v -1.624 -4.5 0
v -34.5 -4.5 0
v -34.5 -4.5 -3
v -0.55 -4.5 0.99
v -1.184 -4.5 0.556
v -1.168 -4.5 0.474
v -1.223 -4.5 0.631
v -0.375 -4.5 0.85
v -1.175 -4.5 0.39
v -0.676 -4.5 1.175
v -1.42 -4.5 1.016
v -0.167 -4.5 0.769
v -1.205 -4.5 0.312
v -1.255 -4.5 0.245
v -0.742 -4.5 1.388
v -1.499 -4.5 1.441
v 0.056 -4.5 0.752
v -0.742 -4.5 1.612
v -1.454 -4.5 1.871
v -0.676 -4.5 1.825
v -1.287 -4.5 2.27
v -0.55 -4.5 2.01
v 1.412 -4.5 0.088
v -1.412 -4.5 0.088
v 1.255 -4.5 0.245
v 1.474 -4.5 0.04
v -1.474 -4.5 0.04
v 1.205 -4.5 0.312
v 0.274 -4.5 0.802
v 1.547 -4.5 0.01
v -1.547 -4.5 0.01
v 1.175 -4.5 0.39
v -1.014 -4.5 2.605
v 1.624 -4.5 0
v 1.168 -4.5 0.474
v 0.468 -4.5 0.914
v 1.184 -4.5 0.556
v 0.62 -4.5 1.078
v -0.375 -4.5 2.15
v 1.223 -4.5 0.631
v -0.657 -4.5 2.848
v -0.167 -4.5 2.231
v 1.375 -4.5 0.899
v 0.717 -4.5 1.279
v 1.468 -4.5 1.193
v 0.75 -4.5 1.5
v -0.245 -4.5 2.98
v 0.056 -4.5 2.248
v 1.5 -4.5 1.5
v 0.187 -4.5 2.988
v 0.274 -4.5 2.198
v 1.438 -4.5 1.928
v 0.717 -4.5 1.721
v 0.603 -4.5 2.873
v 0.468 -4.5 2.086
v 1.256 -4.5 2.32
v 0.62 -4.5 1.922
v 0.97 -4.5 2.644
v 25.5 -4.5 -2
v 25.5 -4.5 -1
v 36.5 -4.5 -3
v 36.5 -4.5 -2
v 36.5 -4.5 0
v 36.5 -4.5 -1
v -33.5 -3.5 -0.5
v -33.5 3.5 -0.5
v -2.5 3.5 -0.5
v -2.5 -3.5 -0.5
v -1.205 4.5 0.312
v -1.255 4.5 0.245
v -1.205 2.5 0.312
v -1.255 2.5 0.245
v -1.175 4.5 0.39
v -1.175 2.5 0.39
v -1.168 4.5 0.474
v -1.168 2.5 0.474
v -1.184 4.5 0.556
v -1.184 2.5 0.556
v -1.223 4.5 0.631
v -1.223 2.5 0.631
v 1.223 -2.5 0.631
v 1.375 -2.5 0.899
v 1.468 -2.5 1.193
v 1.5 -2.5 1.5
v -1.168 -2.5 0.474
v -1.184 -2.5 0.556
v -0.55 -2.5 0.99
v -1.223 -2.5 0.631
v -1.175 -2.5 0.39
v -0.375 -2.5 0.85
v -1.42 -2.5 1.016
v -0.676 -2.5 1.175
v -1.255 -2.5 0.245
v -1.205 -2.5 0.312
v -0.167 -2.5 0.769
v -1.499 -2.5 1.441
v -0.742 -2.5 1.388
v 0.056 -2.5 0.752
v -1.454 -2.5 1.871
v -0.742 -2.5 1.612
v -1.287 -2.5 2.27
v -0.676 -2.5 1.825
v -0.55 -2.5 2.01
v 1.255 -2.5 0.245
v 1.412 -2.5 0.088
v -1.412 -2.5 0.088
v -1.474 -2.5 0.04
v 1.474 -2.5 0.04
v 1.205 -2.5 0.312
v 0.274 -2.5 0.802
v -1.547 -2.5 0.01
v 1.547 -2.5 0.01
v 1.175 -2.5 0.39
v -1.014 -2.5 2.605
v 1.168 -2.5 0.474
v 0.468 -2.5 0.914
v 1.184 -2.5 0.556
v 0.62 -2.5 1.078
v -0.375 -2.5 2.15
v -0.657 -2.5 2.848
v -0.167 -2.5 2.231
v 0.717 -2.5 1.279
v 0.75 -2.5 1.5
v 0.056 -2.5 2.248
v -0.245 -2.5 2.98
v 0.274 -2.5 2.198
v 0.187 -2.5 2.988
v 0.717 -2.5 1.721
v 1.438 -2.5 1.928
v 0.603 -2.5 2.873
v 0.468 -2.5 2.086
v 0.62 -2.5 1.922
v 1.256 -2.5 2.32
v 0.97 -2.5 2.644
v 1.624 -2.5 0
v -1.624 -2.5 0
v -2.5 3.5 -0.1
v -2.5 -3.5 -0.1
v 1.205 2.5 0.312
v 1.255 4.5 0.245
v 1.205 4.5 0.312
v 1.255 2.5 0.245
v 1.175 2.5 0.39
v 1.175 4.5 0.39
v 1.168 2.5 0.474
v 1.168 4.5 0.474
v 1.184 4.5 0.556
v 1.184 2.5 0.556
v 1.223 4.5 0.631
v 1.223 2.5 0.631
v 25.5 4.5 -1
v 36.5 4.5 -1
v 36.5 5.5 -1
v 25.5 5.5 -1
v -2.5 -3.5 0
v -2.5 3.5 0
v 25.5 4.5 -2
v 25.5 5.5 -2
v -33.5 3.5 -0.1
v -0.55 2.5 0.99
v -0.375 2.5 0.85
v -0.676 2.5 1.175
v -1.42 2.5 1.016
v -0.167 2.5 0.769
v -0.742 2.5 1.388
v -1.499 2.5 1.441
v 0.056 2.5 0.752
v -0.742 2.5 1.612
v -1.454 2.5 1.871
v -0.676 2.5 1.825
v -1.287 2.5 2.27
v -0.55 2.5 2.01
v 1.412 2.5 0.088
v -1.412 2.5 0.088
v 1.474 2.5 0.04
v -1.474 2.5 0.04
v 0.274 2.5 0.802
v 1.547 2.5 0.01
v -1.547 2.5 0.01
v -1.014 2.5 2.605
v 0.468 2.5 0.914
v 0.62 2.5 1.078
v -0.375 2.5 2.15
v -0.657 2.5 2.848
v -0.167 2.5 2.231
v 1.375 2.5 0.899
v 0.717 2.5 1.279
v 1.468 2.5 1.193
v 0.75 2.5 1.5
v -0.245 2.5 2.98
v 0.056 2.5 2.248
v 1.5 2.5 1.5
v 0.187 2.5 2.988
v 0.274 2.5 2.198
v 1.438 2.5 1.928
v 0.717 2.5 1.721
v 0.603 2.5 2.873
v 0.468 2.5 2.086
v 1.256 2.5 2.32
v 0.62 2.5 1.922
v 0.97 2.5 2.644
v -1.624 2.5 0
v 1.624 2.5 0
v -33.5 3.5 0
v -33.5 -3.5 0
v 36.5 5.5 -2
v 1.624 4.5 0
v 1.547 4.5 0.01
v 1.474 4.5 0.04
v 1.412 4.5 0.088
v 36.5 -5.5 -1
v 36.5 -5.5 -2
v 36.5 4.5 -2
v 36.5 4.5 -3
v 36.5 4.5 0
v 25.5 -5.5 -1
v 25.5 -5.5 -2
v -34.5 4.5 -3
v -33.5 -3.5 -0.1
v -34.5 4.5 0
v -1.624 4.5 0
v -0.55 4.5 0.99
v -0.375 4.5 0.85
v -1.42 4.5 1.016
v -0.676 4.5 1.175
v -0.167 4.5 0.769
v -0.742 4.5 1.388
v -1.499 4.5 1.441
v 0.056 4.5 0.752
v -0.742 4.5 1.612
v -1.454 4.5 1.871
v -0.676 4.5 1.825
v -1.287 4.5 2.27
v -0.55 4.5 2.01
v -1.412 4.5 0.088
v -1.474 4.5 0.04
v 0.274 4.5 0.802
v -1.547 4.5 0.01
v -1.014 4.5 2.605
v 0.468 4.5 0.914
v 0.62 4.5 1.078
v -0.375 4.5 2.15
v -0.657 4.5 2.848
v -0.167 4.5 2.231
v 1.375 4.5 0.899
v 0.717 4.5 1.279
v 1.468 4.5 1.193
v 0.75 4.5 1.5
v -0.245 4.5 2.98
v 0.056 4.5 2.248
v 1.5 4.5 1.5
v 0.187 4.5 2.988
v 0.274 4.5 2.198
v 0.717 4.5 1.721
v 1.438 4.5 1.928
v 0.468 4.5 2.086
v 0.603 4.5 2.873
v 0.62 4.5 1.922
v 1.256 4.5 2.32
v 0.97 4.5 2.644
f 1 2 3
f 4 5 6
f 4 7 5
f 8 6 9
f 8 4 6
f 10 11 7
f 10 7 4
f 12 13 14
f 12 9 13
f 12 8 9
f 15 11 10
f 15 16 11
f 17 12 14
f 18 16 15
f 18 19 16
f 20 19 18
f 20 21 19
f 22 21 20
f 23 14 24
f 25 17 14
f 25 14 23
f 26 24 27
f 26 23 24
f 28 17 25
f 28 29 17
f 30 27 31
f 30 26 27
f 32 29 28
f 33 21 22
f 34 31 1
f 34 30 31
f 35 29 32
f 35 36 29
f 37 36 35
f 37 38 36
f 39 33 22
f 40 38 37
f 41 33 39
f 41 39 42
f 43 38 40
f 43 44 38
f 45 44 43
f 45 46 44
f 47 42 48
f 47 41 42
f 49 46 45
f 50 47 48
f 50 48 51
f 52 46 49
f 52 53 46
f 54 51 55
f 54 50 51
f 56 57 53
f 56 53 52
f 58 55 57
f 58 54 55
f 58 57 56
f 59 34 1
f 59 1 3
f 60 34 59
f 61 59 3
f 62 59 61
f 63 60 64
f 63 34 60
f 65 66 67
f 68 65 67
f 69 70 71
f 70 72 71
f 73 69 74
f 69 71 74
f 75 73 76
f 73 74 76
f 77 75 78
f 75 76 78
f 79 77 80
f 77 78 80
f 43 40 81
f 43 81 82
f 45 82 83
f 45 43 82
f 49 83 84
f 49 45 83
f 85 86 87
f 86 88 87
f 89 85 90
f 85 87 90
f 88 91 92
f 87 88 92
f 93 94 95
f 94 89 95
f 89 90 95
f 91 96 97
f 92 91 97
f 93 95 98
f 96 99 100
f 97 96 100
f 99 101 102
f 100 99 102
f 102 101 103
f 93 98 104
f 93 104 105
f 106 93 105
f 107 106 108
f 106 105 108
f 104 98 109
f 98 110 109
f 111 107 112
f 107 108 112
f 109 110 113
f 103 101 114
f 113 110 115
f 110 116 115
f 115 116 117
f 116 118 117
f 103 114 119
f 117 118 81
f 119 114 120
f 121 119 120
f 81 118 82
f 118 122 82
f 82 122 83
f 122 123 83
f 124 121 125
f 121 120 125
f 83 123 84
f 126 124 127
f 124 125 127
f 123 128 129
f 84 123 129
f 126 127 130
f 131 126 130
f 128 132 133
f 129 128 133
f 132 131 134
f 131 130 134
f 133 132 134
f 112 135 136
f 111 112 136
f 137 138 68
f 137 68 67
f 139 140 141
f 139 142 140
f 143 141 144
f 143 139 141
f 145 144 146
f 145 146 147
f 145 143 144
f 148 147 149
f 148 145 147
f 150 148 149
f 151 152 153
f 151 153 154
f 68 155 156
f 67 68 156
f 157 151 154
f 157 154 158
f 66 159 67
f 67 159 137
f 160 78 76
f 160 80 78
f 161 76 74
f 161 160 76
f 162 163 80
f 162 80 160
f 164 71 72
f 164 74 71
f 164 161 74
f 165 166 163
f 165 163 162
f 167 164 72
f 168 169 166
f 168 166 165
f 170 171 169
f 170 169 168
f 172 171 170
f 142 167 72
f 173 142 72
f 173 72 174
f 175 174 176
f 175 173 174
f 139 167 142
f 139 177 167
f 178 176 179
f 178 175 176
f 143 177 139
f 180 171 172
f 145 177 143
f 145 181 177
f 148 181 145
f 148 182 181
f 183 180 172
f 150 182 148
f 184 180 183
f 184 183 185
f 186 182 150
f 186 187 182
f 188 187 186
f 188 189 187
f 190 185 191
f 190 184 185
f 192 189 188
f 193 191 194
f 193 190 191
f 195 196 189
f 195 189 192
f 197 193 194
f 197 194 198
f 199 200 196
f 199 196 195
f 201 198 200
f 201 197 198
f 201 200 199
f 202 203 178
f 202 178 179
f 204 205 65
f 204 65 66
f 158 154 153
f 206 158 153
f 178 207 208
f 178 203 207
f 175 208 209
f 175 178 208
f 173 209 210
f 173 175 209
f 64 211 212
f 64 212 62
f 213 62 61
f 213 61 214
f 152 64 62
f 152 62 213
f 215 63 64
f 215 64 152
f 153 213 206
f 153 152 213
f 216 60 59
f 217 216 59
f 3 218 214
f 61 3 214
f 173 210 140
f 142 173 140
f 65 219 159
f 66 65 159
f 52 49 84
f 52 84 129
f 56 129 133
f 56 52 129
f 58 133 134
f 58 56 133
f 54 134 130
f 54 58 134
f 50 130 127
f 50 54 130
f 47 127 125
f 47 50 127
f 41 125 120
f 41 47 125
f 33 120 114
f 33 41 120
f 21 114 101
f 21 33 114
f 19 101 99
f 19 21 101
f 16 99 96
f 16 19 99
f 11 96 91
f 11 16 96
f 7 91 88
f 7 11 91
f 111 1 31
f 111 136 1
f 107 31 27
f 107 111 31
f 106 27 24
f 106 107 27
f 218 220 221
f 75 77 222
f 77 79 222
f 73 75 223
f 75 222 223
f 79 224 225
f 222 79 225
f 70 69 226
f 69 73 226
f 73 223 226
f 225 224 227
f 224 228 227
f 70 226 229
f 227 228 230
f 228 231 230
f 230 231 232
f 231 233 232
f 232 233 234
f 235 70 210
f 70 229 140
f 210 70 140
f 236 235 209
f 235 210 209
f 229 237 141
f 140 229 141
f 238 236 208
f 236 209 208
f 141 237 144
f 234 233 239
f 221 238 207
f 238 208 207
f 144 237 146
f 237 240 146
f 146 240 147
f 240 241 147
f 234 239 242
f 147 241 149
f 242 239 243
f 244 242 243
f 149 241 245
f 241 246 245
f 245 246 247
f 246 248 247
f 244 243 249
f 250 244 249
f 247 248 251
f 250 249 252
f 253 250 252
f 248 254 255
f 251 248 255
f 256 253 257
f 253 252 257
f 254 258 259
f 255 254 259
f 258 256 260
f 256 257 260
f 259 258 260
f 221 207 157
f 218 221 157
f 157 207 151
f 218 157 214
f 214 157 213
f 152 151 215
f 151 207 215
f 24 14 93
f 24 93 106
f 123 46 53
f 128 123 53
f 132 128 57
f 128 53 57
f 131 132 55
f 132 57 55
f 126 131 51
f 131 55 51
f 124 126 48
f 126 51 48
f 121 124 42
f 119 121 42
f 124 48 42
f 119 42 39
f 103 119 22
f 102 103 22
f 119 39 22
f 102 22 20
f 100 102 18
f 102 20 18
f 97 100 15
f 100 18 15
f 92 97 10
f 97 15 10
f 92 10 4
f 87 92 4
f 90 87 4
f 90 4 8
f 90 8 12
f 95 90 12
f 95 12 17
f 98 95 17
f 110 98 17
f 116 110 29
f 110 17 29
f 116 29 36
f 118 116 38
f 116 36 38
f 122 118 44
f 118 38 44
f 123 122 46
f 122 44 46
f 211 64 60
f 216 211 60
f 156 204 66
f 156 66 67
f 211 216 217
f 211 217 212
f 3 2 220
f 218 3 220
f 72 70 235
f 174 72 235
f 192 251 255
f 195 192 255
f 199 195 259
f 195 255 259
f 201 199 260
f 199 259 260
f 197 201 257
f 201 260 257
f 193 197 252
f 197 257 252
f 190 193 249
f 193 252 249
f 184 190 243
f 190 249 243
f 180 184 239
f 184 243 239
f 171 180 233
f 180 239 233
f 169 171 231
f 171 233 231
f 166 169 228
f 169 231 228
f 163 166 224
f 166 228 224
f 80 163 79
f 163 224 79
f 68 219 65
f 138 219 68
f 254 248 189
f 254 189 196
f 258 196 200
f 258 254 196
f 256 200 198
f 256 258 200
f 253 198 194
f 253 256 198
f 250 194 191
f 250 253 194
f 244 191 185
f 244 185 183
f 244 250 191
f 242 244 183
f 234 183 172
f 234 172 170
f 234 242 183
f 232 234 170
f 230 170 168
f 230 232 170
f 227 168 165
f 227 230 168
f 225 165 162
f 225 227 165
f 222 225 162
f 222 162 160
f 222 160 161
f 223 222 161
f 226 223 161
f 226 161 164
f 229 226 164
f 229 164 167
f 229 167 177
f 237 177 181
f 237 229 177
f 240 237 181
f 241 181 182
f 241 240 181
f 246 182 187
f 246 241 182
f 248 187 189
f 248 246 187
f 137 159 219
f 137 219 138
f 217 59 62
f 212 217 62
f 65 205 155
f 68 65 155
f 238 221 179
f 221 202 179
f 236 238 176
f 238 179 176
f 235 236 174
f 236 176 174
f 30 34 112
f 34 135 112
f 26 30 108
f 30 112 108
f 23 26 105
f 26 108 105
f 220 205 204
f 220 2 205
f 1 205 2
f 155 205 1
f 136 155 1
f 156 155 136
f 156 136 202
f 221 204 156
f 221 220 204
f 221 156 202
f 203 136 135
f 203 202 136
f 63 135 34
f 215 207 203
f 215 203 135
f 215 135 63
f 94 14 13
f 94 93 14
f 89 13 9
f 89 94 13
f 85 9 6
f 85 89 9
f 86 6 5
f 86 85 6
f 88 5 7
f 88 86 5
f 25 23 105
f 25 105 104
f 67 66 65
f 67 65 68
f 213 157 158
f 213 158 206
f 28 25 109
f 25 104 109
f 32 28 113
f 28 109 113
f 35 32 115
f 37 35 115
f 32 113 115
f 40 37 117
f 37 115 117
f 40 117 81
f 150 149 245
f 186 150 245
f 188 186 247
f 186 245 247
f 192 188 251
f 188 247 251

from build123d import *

# Parameters (mm, degrees)
F0_W          = 71
F0_H          = 9
F0_W_2        = 31
F0_H_2        = 7
F1_DEPTH      = 3
F3_R          = 0.75
F4_DEPTH      = 2
F5_R          = 0.3
F7_DEPTH      = 1
F7_DEPTH_BACK = 10
F8_DEPTH      = 0.5
F9_DEPTH      = 0.5
F10_DEPTH     = 0.1


with BuildPart() as f1:
    # F0 (on Top) → F1 (new body)
    with BuildSketch(Plane.XY):
        with Locations((1, 0)):
            Rectangle(F0_W, F0_H)
        with Locations((-18, 0)):
            Rectangle(F0_W_2, F0_H_2, mode=Mode.SUBTRACT)
        with Locations((-18, 0)):
            Rectangle(F0_W_2, F0_H_2)
    extrude(amount=-F1_DEPTH)

    # F3 (on offset) → F4 (join)
    with BuildSketch(Plane.XZ.offset(4.5)):
        with BuildLine():
            ThreePointArc((1.06066, 0.43934), (1.385819, 0.925975), (1.5, 1.5))
            ThreePointArc((1.5, 1.5), (-0.574025, 2.885819), (-1.06066, 0.43934))
            ThreePointArc((-1.06066, 0.43934), (-0.574025, 0.114181), (0, 0))
            ThreePointArc((0, 0), (0.574025, 0.114181), (1.06066, 0.43934))
        make_face()
        with Locations((0, 1.5)):
            Circle(F3_R, mode=Mode.SUBTRACT)
        with BuildLine():
            ThreePointArc((0, 0), (-0.574025, 0.114181), (-1.06066, 0.43934))
            Line((-1.06066, 0.43934), (-1.5, 0))
            Line((-1.5, 0), (0, 0))
        make_face()
        with BuildLine():
            Line((1.5, 0), (1.06066, 0.43934))
            ThreePointArc((1.06066, 0.43934), (0.574025, 0.114181), (0, 0))
            Line((0, 0), (1.5, 0))
        make_face()
    extrude(amount=-F4_DEPTH)

    # F5
    f5_edges = [f1.edges().sort_by_distance(p)[0] for p in [
        (1.06066, -3.5, 0.43934),
        (-1.06066, -3.5, 0.43934),
        (-1.5, -3.5, 0),
        (1.5, -3.5, 0),
    ]]
    fillet(f5_edges, radius=F5_R)

    # F6: F1 across plane


with BuildPart() as f1_1:
    add(f1.part)
    add(f1.part.mirror(Plane.XZ))

    # F3 (on offset) → F7 (join, two sides)
    with BuildSketch(Plane.XZ.offset(4.5)) as f7_sk:
        Polygon((36.5, -2), (36.5, -1), (35.5, -1), (25.5, -1), (25.5, -2), (35.5, -2), align=None)
    extrude(amount=F7_DEPTH)
    extrude(f7_sk.sketch, amount=-F7_DEPTH_BACK)

    # F0 (on Top) → F8 (cut)
    with BuildSketch(Plane.XY):
        with Locations((-18, 0)):
            Rectangle(F0_W_2, F0_H_2)
    extrude(amount=-F8_DEPTH, mode=Mode.SUBTRACT)


with BuildPart() as f9:
    # F0 (on Top) → F9 (new body)
    with BuildSketch(Plane.XY):
        with Locations((-18, 0)):
            Rectangle(F0_W_2, F0_H_2)
    extrude(amount=-F9_DEPTH)

    # F0 (on Top) → F10 (cut)
    with BuildSketch(Plane.XY):
        with Locations((-18, 0)):
            Rectangle(F0_W_2, F0_H_2)
    extrude(amount=-F10_DEPTH, mode=Mode.SUBTRACT)


solid = Compound([f1_1.part, f9.part])
